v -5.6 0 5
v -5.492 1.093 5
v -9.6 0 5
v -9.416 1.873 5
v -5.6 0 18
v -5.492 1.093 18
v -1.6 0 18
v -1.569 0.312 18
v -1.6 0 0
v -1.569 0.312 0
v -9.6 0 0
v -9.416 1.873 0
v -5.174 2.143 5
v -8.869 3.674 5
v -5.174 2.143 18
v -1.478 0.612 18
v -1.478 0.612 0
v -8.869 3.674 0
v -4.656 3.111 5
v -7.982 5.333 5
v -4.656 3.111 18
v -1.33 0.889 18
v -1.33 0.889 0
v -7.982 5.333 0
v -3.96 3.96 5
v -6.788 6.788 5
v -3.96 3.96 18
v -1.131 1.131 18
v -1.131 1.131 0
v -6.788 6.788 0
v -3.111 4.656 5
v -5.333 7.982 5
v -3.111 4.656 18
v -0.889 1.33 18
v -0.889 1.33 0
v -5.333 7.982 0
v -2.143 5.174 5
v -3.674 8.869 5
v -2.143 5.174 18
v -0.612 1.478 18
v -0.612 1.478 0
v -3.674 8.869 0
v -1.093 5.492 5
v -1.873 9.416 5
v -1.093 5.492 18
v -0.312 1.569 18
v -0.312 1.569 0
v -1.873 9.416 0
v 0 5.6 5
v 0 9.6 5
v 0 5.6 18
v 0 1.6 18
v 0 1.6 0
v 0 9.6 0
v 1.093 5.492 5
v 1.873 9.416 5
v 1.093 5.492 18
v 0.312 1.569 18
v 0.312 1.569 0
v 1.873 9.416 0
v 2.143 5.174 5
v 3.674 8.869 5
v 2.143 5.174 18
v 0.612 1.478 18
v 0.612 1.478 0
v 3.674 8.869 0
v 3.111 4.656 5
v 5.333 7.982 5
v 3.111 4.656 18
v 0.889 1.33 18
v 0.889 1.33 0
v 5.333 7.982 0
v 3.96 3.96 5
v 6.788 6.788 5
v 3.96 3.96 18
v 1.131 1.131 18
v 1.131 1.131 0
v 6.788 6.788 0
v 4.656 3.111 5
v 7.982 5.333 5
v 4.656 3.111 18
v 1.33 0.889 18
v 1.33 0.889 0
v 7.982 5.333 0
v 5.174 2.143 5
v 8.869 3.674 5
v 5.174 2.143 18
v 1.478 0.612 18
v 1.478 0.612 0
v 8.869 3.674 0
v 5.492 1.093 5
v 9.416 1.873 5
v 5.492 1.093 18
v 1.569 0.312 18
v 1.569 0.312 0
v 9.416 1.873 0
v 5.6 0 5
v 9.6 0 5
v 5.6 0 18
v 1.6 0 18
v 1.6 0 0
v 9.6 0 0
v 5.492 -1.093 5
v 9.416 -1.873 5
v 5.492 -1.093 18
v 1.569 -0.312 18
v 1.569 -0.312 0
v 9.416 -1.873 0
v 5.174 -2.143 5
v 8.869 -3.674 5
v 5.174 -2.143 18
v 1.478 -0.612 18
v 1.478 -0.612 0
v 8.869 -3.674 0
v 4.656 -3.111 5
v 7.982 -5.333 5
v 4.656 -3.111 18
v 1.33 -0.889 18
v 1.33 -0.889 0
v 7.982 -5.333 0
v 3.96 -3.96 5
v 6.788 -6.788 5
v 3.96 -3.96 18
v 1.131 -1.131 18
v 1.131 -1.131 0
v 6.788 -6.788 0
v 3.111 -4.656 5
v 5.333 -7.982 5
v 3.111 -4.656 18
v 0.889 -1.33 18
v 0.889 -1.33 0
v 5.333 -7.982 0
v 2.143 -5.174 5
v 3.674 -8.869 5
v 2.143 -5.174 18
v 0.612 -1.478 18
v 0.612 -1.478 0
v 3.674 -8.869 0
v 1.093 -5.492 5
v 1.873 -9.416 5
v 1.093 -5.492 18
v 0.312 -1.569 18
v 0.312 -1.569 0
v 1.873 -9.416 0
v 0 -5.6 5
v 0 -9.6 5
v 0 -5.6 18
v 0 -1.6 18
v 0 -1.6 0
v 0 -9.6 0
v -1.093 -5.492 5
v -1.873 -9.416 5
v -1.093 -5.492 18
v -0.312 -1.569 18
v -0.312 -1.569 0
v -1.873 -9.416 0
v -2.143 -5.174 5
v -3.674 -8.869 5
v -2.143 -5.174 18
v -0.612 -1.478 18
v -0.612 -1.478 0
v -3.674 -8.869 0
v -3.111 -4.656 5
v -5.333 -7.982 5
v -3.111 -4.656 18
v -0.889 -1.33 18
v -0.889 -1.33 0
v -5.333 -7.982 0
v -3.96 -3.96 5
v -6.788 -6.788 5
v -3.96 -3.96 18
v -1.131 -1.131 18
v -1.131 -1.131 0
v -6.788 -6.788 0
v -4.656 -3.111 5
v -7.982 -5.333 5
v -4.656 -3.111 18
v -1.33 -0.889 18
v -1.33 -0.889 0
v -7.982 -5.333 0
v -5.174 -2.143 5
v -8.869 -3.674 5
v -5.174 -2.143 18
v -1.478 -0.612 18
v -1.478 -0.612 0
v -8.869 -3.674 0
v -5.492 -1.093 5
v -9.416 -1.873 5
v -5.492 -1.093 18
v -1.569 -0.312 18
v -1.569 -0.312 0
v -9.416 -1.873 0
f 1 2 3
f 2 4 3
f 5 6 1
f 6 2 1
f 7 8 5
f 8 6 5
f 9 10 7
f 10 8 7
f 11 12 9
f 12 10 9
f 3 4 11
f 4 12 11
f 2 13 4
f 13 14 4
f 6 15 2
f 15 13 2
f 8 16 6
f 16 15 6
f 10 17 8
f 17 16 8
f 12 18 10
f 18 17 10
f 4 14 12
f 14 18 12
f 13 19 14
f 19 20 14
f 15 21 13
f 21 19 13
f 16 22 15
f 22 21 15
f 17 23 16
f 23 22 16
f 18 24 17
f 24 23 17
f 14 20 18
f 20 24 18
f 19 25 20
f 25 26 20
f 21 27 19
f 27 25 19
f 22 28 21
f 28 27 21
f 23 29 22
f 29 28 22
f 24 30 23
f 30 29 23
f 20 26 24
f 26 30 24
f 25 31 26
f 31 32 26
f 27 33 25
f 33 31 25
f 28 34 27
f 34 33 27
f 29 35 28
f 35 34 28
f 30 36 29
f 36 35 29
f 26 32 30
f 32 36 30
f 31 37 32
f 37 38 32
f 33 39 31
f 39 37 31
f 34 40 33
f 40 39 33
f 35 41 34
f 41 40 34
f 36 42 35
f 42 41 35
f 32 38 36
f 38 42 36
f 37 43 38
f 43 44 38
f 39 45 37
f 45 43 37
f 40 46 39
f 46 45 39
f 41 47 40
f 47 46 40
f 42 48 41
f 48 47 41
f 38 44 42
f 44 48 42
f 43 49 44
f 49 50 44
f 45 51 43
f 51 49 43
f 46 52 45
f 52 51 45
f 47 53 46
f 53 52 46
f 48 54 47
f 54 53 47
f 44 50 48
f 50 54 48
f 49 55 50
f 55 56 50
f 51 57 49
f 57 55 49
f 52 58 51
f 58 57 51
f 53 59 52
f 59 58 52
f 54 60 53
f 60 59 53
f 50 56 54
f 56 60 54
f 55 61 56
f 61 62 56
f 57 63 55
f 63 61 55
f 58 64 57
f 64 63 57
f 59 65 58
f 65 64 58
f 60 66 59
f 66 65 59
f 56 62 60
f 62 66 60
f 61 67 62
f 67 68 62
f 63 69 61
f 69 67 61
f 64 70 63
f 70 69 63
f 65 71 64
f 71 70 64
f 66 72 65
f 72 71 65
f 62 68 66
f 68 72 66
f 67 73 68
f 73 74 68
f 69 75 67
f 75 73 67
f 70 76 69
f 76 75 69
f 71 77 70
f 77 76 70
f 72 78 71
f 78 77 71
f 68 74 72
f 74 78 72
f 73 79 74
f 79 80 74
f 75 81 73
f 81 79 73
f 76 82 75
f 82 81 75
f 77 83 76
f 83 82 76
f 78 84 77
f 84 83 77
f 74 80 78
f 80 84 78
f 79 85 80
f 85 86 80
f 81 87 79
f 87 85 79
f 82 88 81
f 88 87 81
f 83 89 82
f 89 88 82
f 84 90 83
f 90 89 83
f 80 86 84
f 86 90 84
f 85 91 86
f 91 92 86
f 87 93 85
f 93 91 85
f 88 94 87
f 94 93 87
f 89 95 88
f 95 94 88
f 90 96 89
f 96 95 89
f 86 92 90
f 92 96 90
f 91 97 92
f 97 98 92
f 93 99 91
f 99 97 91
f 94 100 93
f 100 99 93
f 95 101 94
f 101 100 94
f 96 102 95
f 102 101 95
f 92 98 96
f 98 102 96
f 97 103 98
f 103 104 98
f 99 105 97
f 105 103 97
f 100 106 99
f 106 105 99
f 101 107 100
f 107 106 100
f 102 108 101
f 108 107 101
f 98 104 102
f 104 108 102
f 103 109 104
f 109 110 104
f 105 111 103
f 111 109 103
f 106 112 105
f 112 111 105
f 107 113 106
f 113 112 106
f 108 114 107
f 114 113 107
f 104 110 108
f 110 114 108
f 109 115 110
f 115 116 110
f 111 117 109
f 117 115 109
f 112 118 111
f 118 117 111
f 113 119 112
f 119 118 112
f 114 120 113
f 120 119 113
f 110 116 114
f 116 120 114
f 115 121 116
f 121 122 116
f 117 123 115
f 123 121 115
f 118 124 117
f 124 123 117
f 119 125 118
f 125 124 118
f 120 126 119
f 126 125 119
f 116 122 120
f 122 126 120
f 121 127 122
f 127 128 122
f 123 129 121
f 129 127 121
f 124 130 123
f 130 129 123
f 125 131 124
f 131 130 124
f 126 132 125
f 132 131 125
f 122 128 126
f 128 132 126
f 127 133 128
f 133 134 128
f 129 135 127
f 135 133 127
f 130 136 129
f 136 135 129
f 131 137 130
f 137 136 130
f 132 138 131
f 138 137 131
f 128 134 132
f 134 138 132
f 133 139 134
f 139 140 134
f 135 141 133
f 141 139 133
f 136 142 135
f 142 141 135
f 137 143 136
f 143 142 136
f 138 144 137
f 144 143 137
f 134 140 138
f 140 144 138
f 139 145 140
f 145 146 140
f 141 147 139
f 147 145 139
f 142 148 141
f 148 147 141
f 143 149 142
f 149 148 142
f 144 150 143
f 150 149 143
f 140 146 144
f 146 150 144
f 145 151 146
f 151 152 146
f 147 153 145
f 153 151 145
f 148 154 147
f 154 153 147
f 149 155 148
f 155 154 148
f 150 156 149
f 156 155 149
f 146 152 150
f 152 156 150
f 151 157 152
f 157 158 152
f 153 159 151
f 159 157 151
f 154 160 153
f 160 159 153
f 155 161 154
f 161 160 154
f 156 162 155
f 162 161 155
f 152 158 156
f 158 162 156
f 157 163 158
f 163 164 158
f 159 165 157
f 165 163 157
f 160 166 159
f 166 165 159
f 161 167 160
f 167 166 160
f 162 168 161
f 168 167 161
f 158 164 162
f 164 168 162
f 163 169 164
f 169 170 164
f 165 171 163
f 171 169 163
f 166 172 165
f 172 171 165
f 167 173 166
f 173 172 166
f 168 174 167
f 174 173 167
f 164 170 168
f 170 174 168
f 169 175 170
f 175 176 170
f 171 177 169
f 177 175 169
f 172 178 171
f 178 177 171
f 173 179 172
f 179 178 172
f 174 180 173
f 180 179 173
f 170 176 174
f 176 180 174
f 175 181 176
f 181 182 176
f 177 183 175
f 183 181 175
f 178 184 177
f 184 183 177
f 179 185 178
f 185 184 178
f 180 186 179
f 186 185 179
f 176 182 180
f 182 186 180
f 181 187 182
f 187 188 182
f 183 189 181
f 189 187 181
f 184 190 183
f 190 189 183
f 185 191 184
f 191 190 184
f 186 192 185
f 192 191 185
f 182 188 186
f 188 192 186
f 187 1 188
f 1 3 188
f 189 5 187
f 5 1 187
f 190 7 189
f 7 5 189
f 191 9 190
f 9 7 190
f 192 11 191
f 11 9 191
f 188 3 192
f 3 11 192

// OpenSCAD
$fn = 32;

// ----------------------------------------------------------------------
// Profiled standoff: flanged spacer, 18 mm long, bore 3.2 mm
// ----------------------------------------------------------------------

// --- parameters (mm) ---
revolve_angle = 360;      // full turn around the Z axis
profile_points = 6;       // points of the closed outline

profile = [[1.6, 0], [9.6, 0], [9.6, 5], [5.6, 5], [5.6, 18], [1.6, 18]];  // single closed polygon, 6 points, counter clockwise

// --- the one profile operation ---
rotate_extrude(angle = revolve_angle) polygon(points = profile);
